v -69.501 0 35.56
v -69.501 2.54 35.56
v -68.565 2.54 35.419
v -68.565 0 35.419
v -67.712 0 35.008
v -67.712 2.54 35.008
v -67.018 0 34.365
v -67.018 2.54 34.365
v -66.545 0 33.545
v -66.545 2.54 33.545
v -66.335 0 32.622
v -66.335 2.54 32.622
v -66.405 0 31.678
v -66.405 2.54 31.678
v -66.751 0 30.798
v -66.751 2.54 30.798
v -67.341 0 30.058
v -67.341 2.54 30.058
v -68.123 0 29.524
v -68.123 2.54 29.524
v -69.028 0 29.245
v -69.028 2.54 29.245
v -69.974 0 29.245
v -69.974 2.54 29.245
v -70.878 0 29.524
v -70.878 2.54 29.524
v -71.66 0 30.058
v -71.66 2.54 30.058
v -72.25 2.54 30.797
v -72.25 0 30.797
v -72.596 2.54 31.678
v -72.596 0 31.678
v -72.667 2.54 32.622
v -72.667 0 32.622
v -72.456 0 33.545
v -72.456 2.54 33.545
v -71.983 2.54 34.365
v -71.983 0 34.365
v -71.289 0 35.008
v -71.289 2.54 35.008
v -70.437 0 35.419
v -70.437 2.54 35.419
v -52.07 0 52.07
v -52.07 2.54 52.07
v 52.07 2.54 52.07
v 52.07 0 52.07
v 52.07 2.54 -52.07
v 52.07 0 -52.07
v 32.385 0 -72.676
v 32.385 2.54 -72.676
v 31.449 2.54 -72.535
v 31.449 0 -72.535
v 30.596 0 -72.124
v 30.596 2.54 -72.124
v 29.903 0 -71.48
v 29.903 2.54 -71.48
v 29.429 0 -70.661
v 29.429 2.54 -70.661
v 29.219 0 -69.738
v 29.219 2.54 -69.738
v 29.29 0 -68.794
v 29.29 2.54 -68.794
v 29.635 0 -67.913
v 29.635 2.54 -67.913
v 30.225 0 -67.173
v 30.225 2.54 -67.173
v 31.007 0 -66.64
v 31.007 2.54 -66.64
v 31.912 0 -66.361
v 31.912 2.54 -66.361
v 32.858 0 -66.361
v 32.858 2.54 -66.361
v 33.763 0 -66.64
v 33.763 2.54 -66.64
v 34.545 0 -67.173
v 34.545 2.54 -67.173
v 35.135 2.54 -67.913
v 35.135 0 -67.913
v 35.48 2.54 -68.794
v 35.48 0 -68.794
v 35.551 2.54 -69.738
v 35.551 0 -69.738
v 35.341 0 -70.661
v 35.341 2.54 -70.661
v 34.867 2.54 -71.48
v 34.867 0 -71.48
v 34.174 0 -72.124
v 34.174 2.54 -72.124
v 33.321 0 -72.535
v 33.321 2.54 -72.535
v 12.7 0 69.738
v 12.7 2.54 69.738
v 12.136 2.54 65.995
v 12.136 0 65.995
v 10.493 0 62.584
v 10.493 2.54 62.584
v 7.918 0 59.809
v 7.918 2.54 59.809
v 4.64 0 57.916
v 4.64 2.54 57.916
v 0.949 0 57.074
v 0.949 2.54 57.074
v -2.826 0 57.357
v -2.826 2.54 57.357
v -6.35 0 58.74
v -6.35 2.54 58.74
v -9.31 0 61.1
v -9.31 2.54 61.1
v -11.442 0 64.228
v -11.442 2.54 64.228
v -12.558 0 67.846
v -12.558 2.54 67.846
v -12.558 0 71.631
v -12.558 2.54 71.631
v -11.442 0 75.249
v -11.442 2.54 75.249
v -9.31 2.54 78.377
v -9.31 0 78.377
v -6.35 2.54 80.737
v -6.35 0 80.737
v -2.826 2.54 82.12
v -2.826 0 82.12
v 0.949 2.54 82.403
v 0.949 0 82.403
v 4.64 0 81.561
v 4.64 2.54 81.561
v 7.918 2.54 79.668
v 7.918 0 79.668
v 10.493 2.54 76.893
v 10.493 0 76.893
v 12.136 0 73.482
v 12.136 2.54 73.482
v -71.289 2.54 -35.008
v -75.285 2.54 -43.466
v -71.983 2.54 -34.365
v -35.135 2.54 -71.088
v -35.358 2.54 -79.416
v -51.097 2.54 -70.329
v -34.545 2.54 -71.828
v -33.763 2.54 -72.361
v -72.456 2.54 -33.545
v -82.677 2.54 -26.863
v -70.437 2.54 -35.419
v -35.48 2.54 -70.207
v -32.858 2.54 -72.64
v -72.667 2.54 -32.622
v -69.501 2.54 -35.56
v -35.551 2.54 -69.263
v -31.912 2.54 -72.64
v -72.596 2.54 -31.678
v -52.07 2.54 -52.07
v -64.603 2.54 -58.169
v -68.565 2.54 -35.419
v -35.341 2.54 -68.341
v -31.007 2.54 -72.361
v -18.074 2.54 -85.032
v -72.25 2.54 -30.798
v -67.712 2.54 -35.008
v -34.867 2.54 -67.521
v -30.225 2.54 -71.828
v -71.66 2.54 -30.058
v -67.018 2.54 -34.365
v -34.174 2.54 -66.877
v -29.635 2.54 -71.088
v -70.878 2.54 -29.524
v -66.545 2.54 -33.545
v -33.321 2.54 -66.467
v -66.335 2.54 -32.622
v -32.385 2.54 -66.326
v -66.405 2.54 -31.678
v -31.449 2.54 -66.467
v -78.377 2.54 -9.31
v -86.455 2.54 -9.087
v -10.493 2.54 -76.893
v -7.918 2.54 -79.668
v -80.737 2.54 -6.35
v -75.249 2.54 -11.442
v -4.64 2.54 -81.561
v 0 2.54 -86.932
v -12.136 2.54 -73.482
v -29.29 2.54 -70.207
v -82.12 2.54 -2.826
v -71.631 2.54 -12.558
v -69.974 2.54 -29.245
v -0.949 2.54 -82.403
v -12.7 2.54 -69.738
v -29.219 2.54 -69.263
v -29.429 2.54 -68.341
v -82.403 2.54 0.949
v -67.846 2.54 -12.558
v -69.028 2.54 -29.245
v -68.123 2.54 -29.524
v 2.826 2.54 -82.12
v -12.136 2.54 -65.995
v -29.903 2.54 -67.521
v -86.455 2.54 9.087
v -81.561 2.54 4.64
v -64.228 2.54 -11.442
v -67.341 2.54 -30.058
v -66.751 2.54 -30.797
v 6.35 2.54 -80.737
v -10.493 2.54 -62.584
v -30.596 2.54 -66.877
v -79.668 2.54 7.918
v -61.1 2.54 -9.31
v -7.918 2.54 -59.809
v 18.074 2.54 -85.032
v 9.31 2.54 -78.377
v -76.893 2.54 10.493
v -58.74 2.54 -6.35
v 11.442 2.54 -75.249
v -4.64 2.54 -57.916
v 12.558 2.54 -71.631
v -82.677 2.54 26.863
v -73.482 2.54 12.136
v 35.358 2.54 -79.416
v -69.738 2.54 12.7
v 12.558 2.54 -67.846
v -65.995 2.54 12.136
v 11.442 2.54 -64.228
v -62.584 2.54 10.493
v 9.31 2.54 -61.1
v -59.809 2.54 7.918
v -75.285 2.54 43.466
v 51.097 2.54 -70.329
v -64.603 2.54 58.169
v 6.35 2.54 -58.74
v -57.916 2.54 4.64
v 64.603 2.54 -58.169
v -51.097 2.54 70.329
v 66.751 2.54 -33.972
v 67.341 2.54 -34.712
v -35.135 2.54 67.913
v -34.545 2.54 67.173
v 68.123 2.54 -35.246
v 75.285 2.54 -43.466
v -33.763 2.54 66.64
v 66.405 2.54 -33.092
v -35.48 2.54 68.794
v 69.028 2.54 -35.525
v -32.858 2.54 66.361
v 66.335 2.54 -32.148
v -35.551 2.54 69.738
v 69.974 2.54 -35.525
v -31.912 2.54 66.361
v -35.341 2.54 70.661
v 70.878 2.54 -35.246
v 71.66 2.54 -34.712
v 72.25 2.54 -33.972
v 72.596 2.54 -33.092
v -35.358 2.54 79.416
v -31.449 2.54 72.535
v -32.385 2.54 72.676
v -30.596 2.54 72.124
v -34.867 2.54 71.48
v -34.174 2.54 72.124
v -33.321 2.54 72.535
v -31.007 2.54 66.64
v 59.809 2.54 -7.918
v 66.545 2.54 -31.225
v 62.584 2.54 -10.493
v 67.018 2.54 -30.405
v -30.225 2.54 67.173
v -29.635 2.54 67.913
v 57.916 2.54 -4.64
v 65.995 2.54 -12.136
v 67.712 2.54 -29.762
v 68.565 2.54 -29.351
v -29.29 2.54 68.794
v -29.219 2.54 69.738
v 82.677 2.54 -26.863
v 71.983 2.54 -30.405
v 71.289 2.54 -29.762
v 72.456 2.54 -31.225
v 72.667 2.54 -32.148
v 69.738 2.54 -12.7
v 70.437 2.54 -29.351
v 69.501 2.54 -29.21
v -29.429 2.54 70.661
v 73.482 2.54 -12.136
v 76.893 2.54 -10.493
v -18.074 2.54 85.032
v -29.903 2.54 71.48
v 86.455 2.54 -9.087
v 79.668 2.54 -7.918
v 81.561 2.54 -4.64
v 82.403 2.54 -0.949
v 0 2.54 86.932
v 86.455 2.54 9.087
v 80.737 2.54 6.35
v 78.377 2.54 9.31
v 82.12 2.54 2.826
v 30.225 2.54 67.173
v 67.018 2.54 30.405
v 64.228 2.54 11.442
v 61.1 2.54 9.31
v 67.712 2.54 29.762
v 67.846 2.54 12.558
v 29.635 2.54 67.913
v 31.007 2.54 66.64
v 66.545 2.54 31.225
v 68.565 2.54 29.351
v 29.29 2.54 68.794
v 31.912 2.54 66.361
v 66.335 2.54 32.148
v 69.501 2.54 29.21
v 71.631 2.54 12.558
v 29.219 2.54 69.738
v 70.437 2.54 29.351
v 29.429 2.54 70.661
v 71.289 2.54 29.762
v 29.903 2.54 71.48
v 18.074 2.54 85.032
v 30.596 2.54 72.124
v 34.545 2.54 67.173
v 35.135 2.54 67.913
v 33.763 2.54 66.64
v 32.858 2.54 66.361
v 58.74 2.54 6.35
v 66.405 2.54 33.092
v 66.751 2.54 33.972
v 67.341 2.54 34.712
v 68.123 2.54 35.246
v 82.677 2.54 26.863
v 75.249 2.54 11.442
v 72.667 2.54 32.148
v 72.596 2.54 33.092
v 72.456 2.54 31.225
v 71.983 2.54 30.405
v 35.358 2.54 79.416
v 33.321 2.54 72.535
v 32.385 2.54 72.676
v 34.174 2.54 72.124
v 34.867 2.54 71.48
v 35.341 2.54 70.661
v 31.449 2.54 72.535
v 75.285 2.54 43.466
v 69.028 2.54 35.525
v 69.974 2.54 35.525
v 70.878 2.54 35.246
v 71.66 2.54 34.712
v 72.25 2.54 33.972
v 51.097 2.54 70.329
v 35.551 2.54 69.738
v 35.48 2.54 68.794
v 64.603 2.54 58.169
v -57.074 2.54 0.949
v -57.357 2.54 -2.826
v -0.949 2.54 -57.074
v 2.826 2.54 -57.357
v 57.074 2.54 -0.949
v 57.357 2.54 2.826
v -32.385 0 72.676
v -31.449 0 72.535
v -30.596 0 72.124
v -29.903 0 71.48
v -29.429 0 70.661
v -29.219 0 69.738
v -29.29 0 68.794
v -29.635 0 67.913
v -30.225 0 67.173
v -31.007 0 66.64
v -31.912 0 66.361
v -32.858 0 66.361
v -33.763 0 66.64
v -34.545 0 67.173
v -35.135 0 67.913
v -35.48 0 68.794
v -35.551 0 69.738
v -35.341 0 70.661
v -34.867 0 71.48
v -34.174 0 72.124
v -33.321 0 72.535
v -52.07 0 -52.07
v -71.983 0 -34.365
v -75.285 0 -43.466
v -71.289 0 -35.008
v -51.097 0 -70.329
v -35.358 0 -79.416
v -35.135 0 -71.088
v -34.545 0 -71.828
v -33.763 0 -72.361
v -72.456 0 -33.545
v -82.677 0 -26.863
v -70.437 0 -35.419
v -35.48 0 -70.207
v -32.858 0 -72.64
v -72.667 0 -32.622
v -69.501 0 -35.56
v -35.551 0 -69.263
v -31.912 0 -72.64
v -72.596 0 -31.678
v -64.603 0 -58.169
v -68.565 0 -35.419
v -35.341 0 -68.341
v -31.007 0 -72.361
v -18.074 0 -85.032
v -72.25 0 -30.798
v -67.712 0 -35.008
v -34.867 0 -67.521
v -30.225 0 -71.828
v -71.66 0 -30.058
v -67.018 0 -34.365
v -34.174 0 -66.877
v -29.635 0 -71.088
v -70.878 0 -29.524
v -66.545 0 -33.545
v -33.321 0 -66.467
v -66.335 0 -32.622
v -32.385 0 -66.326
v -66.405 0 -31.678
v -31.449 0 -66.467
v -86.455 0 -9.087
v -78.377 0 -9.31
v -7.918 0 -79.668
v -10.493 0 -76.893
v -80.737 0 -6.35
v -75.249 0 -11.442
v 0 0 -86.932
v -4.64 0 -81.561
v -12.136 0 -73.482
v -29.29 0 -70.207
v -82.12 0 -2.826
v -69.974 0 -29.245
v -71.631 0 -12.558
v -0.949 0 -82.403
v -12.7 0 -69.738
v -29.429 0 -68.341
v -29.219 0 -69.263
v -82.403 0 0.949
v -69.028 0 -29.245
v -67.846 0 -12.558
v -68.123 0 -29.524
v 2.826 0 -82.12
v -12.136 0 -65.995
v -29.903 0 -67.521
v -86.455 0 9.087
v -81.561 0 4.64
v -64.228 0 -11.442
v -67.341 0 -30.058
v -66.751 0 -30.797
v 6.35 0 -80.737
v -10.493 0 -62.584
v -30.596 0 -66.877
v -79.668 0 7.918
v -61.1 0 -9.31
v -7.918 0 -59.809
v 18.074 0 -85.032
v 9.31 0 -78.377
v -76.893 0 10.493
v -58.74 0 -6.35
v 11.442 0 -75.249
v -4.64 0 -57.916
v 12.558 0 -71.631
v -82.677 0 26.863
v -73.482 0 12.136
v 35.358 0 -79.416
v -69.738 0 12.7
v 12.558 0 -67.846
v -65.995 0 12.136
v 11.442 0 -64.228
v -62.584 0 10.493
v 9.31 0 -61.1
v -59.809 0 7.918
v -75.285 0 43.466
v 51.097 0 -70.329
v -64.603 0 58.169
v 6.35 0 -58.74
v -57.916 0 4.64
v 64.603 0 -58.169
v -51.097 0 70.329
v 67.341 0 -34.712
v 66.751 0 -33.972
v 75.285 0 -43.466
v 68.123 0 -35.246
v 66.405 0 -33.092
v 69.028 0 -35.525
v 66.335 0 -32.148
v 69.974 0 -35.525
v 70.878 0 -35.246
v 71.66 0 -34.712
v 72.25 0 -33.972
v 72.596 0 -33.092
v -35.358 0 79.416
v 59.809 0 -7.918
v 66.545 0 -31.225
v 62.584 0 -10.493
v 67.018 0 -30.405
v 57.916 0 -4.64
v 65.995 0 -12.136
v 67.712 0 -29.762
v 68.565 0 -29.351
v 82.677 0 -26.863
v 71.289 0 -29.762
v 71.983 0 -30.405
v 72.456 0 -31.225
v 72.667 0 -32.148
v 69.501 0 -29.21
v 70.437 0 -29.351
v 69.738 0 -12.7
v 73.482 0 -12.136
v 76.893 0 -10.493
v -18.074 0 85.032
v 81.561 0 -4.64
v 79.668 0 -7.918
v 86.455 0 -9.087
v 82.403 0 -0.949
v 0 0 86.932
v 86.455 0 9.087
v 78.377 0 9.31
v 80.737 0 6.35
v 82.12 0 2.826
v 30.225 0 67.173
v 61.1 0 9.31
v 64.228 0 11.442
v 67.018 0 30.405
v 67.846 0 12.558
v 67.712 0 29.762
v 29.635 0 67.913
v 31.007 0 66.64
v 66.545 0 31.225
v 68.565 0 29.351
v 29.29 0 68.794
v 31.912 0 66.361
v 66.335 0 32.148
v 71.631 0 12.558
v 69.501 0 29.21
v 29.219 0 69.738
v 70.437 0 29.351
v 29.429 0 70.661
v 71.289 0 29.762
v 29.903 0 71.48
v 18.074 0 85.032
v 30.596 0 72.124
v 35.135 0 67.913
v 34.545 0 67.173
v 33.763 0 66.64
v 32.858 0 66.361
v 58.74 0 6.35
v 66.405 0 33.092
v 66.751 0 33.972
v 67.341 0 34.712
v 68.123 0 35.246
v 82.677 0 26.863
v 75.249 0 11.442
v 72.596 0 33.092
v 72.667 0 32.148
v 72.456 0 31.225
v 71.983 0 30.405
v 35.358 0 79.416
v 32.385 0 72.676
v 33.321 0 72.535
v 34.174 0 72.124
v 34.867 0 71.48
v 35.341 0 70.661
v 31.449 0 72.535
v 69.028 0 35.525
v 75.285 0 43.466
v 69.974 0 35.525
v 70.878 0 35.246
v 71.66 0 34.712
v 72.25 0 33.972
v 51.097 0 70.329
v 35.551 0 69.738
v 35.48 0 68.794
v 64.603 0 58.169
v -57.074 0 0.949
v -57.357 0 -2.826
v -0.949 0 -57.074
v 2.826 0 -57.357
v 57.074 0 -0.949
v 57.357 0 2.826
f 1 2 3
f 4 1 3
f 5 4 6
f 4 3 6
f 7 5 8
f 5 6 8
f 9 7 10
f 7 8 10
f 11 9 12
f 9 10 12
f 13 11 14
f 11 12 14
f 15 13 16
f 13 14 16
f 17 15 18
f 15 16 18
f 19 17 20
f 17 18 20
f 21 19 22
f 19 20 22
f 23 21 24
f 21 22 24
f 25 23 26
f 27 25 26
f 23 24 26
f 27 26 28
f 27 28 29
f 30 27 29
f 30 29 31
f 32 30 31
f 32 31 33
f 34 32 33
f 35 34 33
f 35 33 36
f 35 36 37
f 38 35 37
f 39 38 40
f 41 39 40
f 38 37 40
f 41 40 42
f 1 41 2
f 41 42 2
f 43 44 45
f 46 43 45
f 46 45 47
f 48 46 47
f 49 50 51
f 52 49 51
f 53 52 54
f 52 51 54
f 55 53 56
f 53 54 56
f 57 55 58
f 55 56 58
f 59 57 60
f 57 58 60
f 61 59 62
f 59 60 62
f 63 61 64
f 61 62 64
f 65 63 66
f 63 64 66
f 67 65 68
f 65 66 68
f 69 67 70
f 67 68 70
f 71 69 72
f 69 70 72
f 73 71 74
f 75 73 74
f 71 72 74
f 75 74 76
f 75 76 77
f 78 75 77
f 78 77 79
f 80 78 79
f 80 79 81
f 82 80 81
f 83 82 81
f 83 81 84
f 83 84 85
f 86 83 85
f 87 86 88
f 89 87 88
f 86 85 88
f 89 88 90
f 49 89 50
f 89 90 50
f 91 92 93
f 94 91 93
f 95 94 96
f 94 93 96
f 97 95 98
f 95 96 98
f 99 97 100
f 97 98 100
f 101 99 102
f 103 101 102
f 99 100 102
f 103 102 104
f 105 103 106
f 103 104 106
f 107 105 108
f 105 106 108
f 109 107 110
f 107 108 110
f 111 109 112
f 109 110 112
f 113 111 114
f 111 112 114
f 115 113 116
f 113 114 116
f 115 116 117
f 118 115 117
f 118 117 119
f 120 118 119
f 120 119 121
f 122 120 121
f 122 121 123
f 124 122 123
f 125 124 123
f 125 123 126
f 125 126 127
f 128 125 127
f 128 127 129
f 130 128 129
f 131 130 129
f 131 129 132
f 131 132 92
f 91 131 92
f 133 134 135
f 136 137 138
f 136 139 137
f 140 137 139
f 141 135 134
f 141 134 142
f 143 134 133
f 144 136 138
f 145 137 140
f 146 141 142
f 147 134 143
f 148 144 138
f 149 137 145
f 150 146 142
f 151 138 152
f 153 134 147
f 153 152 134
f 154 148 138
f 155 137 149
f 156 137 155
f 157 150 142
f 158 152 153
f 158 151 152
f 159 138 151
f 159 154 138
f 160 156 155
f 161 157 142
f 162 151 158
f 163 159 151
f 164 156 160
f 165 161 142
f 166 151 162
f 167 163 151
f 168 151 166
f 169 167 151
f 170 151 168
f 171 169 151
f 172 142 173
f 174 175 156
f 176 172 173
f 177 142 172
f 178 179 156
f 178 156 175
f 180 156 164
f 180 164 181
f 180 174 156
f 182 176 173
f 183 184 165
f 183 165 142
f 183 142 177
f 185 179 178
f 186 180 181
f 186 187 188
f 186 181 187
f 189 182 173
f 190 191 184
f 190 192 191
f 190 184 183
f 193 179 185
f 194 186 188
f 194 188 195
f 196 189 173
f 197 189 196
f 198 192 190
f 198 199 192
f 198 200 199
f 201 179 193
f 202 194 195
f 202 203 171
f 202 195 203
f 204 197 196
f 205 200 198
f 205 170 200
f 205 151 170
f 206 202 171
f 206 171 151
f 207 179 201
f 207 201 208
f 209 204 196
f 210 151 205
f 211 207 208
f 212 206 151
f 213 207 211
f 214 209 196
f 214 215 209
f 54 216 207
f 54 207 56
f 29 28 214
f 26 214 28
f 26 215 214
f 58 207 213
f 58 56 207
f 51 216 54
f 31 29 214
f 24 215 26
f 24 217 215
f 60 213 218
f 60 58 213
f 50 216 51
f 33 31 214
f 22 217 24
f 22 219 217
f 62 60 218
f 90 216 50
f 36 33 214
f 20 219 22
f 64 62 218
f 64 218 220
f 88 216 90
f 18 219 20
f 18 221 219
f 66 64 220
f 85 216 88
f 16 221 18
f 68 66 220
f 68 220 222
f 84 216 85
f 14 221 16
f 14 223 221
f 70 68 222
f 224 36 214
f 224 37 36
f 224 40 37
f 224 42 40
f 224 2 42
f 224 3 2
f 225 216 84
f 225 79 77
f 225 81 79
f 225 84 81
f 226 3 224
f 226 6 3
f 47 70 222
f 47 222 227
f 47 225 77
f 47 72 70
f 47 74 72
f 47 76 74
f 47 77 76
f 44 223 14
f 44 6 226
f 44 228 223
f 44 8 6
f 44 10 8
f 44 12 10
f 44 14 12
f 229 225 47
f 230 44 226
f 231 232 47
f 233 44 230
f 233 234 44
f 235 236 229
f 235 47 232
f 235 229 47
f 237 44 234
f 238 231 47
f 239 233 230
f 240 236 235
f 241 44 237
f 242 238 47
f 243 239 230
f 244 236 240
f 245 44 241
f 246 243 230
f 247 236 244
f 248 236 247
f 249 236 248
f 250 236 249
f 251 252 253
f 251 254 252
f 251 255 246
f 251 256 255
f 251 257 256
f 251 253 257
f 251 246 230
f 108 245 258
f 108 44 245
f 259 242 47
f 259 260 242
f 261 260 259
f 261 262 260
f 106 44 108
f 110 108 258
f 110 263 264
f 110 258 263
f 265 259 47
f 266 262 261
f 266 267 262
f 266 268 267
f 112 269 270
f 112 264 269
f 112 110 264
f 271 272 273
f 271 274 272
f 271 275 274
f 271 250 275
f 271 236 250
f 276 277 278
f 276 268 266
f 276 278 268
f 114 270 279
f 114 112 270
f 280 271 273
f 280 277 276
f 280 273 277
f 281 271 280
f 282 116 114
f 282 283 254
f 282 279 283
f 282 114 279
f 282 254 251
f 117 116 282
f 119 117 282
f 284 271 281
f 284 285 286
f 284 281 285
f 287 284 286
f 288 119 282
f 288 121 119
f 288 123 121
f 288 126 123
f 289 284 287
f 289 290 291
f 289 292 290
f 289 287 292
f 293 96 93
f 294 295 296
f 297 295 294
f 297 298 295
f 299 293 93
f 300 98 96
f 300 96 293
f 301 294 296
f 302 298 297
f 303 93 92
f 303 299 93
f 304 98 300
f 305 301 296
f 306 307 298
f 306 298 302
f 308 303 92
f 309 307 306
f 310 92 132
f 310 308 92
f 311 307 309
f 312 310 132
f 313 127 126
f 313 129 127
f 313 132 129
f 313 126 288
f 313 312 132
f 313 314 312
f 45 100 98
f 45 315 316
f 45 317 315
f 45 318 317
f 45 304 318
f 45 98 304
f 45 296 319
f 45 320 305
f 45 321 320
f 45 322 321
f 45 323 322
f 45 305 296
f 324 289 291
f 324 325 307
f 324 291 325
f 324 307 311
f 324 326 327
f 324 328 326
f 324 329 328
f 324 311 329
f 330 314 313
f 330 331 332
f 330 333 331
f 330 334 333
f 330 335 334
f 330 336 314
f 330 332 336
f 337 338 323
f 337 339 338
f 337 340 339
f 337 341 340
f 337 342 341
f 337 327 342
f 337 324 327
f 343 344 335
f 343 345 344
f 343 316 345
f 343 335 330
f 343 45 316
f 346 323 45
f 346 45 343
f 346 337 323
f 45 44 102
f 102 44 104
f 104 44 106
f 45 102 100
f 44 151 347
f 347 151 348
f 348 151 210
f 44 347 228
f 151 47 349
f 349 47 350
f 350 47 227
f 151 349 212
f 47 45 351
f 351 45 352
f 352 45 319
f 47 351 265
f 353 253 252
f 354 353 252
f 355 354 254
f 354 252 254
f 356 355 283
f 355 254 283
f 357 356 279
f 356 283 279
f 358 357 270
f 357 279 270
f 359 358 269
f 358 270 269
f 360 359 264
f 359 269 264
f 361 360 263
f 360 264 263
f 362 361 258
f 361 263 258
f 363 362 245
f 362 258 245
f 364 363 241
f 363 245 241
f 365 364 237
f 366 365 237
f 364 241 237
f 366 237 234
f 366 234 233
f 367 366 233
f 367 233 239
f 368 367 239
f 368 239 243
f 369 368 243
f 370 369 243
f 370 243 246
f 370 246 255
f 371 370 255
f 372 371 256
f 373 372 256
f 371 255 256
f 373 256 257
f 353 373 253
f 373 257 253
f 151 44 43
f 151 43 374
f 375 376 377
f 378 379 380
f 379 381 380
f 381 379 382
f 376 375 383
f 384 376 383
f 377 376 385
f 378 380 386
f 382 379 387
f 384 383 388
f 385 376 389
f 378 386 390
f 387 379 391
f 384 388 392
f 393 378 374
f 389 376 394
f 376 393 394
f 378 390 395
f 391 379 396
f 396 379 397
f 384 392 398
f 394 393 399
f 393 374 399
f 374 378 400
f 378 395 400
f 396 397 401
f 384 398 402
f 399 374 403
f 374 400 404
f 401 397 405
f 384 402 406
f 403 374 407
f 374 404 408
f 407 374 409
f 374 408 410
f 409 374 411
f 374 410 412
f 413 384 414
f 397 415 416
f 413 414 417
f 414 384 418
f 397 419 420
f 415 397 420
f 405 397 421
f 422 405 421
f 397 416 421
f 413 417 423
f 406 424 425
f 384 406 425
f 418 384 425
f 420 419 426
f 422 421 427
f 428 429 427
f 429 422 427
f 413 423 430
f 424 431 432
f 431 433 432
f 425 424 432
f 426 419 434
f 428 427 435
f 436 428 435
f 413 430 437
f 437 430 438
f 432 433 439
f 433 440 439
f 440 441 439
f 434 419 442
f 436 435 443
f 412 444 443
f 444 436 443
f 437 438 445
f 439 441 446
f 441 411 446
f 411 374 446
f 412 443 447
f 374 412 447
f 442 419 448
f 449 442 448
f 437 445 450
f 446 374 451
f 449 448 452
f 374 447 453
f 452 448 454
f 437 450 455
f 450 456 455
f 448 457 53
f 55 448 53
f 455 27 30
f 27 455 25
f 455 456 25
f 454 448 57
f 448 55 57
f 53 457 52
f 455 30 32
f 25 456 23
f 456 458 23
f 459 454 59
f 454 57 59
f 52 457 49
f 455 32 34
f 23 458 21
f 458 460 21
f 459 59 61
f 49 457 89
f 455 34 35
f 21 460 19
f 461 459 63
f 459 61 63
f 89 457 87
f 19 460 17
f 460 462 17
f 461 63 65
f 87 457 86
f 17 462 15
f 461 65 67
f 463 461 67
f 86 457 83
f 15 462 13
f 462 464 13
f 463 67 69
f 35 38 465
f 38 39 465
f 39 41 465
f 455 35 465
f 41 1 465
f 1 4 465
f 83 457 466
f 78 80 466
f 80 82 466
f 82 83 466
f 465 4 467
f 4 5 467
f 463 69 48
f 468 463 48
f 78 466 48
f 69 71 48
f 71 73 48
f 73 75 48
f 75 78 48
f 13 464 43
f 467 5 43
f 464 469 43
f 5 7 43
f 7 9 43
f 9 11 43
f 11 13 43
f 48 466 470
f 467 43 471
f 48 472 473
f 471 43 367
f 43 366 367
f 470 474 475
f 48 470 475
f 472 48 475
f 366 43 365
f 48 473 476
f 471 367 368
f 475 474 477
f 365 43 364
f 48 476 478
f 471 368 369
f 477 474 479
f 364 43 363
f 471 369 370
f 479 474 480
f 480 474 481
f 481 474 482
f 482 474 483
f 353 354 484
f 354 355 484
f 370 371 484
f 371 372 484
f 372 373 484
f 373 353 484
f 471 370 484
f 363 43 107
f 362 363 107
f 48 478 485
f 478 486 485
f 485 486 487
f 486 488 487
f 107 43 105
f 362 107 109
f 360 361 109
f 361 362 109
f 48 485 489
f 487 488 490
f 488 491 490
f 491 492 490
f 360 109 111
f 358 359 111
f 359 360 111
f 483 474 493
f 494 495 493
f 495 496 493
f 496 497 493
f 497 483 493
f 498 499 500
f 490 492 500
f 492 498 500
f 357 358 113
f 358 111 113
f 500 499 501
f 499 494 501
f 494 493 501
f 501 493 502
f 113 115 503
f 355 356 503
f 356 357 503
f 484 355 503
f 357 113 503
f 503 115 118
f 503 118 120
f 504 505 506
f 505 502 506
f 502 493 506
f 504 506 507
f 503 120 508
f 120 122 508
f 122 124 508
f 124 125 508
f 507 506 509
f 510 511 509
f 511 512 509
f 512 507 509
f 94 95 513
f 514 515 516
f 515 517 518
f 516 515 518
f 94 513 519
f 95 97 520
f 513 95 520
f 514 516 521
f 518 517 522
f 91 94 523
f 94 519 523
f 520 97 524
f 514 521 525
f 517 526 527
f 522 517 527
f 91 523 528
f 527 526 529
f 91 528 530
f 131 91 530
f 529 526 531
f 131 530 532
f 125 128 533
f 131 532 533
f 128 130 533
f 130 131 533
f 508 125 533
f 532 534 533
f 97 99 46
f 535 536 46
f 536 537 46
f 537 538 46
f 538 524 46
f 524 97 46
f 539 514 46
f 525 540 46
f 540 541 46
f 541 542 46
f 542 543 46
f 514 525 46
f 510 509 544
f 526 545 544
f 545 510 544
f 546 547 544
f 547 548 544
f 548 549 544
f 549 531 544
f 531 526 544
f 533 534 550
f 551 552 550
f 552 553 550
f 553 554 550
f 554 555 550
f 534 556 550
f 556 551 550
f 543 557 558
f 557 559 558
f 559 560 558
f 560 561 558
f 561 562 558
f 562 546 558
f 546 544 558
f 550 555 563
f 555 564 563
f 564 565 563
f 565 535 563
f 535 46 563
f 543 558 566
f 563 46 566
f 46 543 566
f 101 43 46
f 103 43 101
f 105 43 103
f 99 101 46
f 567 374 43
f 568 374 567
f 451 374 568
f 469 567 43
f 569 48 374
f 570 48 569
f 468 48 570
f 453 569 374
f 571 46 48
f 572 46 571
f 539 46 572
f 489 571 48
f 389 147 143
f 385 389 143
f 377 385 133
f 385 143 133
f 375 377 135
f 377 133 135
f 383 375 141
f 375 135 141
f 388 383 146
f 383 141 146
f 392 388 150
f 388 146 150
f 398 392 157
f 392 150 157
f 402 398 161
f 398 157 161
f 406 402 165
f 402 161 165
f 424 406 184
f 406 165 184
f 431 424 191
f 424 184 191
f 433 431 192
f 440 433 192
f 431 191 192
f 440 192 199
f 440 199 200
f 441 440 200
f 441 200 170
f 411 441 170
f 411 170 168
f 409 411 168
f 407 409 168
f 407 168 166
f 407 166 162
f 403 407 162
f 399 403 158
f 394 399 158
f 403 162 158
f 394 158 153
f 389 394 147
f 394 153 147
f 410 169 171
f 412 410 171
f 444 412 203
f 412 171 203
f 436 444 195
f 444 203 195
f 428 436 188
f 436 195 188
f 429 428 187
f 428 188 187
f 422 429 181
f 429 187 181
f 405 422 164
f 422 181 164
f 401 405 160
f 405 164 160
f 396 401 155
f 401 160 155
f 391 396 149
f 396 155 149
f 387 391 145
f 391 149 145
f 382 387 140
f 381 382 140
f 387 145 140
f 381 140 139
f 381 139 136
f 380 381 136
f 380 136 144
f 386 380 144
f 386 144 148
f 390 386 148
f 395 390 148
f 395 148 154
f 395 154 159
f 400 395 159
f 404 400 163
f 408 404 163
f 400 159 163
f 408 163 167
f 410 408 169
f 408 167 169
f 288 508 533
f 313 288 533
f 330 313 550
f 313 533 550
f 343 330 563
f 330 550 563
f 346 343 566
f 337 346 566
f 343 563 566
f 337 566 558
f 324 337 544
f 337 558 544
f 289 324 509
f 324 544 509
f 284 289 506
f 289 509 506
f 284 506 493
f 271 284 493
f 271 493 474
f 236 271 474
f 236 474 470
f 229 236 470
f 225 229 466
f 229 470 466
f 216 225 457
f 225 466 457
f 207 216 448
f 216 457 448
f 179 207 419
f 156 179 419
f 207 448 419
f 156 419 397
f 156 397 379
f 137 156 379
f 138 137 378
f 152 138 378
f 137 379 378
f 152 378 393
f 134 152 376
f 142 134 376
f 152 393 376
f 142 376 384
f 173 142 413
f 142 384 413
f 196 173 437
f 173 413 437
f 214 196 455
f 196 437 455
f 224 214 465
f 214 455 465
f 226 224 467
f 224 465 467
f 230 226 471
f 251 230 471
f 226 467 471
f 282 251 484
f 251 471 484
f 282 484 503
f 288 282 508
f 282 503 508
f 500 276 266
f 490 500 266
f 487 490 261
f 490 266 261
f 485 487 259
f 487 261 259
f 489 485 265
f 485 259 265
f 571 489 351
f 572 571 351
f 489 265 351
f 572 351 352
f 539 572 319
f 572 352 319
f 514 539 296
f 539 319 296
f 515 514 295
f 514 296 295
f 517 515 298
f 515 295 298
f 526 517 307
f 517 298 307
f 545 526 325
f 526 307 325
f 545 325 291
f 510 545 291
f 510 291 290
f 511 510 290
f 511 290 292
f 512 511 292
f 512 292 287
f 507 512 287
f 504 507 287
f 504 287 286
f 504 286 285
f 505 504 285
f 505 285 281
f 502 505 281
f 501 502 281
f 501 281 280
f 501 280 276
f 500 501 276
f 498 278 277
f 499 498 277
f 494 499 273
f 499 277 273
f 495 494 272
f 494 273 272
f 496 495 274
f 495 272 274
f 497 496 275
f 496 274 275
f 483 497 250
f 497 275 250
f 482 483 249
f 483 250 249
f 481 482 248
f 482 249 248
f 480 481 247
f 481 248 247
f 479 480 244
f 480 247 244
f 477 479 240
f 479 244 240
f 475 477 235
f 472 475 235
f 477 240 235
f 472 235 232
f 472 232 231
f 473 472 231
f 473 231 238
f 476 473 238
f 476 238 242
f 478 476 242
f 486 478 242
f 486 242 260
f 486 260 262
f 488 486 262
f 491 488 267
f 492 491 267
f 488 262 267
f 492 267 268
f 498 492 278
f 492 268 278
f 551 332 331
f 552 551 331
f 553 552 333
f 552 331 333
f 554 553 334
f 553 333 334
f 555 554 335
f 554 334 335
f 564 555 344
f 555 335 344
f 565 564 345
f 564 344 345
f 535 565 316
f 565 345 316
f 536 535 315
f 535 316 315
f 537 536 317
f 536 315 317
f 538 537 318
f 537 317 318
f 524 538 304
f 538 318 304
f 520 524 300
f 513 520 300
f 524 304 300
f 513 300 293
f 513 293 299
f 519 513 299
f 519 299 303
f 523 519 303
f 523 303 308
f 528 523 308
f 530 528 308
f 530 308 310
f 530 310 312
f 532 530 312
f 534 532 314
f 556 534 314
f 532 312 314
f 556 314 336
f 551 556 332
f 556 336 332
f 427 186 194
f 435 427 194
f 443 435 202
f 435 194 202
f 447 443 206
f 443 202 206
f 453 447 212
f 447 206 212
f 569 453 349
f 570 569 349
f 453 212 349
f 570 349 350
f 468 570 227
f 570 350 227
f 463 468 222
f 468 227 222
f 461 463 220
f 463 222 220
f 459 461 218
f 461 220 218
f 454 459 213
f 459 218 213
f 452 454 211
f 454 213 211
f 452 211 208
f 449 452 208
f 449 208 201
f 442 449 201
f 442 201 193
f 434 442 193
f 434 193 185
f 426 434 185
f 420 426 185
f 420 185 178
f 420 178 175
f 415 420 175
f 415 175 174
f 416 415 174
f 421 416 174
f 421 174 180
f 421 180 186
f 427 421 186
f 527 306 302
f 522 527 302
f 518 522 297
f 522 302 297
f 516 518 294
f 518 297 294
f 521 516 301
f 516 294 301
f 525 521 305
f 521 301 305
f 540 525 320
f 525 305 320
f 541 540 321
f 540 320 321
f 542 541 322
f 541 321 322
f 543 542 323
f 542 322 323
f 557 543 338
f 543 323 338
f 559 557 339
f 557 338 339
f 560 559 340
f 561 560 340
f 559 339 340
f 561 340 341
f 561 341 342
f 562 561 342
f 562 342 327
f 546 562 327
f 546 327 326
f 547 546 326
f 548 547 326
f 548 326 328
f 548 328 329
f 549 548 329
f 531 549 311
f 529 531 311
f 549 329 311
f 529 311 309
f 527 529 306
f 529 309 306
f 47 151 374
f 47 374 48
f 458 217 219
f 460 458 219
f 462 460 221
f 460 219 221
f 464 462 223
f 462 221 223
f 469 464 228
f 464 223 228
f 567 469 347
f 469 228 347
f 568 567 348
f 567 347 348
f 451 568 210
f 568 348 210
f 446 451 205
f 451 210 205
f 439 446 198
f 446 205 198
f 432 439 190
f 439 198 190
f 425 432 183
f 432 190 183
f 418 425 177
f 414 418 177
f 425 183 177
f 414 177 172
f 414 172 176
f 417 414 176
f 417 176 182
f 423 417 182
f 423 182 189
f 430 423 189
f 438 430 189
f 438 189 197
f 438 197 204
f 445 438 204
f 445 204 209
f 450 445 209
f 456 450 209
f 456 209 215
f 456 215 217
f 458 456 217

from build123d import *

# Parameters (mm, degrees)
SKETCH1_R           = 86.9315
BOSS_EXTRUDE1_DEPTH = 2.54
SKETCH3_W           = 104.14
SKETCH3_H           = 104.14
CUT_EXTRUDE2_DEPTH  = 2.54
SKETCH4_R           = 3.175
CUT_EXTRUDE3_DEPTH  = 2.54
SKETCH5_R           = 12.7
CUT_EXTRUDE4_DEPTH  = 123.965942376
CIRPATTERN1_COUNT   = 4


with BuildPart() as part:
    # Sketch1 → Boss-Extrude1 (new body)
    with BuildSketch(Plane(origin=(0, 0, 0), x_dir=(1, 0, 0), z_dir=(0, 1, 0))):
        with Locations(Location((0, 0, 0), (0, 0, 270))):
            Circle(SKETCH1_R)
    extrude(amount=BOSS_EXTRUDE1_DEPTH)

    # Sketch3 → Cut-Extrude2 (cut)
    with BuildSketch(Plane(origin=(0, 2.54, 0), x_dir=(1, 0, 0), z_dir=(0, 1, 0))):
        Rectangle(SKETCH3_W, SKETCH3_H)
    extrude(amount=-CUT_EXTRUDE2_DEPTH, mode=Mode.SUBTRACT)

    # Sketch4 → Cut-Extrude3 (cut)
    with BuildSketch(Plane(origin=(0, 2.54, 0), x_dir=(1, 0, 0), z_dir=(0, 1, 0))):
        with Locations(Location((-32.385, -69.50075, 0), (0, 0, 270))):
            Circle(SKETCH4_R)
        with Locations(Location((-69.50075, -32.385, 0), (0, 0, 270))):
            Circle(SKETCH4_R)
        with Locations(Location((69.50075, 32.385, 0), (0, 0, 270))):
            Circle(SKETCH4_R)
        with Locations(Location((-69.50075, 32.385, 0), (0, 0, 90))):
            Circle(SKETCH4_R)
        with Locations(Location((-32.385, 69.50075, 0), (0, 0, 270))):
            Circle(SKETCH4_R)
        with Locations(Location((32.385, 69.50075, 0), (0, 0, 90))):
            Circle(SKETCH4_R)
        with Locations(Location((69.50075, -32.385, 0), (0, 0, 90))):
            Circle(SKETCH4_R)
        with Locations(Location((32.385, -69.50075, 0), (0, 0, 270))):
            Circle(SKETCH4_R)
    extrude(amount=-CUT_EXTRUDE3_DEPTH, mode=Mode.SUBTRACT)

    # Sketch5 → Cut-Extrude4 (cut, through all)
    with BuildSketch(Plane(origin=(0, 2.54, 0), x_dir=(1, 0, 0), z_dir=(0, 1, 0))):
        with Locations(Location((-69.738430692, 0, 0), (0, 0, 270))):
            Circle(SKETCH5_R)
    cut_extrude4 = extrude(amount=-CUT_EXTRUDE4_DEPTH, mode=Mode.SUBTRACT)

    # CirPattern1: Cut-Extrude4 ×4 about axis
    cirpattern1_axis = Axis((0, 0, 0), (0, 1, 0))
    for i in range(1, CIRPATTERN1_COUNT):
        add(cut_extrude4.rotate(cirpattern1_axis, i * 360 / CIRPATTERN1_COUNT), mode=Mode.SUBTRACT)


solid = part.part
